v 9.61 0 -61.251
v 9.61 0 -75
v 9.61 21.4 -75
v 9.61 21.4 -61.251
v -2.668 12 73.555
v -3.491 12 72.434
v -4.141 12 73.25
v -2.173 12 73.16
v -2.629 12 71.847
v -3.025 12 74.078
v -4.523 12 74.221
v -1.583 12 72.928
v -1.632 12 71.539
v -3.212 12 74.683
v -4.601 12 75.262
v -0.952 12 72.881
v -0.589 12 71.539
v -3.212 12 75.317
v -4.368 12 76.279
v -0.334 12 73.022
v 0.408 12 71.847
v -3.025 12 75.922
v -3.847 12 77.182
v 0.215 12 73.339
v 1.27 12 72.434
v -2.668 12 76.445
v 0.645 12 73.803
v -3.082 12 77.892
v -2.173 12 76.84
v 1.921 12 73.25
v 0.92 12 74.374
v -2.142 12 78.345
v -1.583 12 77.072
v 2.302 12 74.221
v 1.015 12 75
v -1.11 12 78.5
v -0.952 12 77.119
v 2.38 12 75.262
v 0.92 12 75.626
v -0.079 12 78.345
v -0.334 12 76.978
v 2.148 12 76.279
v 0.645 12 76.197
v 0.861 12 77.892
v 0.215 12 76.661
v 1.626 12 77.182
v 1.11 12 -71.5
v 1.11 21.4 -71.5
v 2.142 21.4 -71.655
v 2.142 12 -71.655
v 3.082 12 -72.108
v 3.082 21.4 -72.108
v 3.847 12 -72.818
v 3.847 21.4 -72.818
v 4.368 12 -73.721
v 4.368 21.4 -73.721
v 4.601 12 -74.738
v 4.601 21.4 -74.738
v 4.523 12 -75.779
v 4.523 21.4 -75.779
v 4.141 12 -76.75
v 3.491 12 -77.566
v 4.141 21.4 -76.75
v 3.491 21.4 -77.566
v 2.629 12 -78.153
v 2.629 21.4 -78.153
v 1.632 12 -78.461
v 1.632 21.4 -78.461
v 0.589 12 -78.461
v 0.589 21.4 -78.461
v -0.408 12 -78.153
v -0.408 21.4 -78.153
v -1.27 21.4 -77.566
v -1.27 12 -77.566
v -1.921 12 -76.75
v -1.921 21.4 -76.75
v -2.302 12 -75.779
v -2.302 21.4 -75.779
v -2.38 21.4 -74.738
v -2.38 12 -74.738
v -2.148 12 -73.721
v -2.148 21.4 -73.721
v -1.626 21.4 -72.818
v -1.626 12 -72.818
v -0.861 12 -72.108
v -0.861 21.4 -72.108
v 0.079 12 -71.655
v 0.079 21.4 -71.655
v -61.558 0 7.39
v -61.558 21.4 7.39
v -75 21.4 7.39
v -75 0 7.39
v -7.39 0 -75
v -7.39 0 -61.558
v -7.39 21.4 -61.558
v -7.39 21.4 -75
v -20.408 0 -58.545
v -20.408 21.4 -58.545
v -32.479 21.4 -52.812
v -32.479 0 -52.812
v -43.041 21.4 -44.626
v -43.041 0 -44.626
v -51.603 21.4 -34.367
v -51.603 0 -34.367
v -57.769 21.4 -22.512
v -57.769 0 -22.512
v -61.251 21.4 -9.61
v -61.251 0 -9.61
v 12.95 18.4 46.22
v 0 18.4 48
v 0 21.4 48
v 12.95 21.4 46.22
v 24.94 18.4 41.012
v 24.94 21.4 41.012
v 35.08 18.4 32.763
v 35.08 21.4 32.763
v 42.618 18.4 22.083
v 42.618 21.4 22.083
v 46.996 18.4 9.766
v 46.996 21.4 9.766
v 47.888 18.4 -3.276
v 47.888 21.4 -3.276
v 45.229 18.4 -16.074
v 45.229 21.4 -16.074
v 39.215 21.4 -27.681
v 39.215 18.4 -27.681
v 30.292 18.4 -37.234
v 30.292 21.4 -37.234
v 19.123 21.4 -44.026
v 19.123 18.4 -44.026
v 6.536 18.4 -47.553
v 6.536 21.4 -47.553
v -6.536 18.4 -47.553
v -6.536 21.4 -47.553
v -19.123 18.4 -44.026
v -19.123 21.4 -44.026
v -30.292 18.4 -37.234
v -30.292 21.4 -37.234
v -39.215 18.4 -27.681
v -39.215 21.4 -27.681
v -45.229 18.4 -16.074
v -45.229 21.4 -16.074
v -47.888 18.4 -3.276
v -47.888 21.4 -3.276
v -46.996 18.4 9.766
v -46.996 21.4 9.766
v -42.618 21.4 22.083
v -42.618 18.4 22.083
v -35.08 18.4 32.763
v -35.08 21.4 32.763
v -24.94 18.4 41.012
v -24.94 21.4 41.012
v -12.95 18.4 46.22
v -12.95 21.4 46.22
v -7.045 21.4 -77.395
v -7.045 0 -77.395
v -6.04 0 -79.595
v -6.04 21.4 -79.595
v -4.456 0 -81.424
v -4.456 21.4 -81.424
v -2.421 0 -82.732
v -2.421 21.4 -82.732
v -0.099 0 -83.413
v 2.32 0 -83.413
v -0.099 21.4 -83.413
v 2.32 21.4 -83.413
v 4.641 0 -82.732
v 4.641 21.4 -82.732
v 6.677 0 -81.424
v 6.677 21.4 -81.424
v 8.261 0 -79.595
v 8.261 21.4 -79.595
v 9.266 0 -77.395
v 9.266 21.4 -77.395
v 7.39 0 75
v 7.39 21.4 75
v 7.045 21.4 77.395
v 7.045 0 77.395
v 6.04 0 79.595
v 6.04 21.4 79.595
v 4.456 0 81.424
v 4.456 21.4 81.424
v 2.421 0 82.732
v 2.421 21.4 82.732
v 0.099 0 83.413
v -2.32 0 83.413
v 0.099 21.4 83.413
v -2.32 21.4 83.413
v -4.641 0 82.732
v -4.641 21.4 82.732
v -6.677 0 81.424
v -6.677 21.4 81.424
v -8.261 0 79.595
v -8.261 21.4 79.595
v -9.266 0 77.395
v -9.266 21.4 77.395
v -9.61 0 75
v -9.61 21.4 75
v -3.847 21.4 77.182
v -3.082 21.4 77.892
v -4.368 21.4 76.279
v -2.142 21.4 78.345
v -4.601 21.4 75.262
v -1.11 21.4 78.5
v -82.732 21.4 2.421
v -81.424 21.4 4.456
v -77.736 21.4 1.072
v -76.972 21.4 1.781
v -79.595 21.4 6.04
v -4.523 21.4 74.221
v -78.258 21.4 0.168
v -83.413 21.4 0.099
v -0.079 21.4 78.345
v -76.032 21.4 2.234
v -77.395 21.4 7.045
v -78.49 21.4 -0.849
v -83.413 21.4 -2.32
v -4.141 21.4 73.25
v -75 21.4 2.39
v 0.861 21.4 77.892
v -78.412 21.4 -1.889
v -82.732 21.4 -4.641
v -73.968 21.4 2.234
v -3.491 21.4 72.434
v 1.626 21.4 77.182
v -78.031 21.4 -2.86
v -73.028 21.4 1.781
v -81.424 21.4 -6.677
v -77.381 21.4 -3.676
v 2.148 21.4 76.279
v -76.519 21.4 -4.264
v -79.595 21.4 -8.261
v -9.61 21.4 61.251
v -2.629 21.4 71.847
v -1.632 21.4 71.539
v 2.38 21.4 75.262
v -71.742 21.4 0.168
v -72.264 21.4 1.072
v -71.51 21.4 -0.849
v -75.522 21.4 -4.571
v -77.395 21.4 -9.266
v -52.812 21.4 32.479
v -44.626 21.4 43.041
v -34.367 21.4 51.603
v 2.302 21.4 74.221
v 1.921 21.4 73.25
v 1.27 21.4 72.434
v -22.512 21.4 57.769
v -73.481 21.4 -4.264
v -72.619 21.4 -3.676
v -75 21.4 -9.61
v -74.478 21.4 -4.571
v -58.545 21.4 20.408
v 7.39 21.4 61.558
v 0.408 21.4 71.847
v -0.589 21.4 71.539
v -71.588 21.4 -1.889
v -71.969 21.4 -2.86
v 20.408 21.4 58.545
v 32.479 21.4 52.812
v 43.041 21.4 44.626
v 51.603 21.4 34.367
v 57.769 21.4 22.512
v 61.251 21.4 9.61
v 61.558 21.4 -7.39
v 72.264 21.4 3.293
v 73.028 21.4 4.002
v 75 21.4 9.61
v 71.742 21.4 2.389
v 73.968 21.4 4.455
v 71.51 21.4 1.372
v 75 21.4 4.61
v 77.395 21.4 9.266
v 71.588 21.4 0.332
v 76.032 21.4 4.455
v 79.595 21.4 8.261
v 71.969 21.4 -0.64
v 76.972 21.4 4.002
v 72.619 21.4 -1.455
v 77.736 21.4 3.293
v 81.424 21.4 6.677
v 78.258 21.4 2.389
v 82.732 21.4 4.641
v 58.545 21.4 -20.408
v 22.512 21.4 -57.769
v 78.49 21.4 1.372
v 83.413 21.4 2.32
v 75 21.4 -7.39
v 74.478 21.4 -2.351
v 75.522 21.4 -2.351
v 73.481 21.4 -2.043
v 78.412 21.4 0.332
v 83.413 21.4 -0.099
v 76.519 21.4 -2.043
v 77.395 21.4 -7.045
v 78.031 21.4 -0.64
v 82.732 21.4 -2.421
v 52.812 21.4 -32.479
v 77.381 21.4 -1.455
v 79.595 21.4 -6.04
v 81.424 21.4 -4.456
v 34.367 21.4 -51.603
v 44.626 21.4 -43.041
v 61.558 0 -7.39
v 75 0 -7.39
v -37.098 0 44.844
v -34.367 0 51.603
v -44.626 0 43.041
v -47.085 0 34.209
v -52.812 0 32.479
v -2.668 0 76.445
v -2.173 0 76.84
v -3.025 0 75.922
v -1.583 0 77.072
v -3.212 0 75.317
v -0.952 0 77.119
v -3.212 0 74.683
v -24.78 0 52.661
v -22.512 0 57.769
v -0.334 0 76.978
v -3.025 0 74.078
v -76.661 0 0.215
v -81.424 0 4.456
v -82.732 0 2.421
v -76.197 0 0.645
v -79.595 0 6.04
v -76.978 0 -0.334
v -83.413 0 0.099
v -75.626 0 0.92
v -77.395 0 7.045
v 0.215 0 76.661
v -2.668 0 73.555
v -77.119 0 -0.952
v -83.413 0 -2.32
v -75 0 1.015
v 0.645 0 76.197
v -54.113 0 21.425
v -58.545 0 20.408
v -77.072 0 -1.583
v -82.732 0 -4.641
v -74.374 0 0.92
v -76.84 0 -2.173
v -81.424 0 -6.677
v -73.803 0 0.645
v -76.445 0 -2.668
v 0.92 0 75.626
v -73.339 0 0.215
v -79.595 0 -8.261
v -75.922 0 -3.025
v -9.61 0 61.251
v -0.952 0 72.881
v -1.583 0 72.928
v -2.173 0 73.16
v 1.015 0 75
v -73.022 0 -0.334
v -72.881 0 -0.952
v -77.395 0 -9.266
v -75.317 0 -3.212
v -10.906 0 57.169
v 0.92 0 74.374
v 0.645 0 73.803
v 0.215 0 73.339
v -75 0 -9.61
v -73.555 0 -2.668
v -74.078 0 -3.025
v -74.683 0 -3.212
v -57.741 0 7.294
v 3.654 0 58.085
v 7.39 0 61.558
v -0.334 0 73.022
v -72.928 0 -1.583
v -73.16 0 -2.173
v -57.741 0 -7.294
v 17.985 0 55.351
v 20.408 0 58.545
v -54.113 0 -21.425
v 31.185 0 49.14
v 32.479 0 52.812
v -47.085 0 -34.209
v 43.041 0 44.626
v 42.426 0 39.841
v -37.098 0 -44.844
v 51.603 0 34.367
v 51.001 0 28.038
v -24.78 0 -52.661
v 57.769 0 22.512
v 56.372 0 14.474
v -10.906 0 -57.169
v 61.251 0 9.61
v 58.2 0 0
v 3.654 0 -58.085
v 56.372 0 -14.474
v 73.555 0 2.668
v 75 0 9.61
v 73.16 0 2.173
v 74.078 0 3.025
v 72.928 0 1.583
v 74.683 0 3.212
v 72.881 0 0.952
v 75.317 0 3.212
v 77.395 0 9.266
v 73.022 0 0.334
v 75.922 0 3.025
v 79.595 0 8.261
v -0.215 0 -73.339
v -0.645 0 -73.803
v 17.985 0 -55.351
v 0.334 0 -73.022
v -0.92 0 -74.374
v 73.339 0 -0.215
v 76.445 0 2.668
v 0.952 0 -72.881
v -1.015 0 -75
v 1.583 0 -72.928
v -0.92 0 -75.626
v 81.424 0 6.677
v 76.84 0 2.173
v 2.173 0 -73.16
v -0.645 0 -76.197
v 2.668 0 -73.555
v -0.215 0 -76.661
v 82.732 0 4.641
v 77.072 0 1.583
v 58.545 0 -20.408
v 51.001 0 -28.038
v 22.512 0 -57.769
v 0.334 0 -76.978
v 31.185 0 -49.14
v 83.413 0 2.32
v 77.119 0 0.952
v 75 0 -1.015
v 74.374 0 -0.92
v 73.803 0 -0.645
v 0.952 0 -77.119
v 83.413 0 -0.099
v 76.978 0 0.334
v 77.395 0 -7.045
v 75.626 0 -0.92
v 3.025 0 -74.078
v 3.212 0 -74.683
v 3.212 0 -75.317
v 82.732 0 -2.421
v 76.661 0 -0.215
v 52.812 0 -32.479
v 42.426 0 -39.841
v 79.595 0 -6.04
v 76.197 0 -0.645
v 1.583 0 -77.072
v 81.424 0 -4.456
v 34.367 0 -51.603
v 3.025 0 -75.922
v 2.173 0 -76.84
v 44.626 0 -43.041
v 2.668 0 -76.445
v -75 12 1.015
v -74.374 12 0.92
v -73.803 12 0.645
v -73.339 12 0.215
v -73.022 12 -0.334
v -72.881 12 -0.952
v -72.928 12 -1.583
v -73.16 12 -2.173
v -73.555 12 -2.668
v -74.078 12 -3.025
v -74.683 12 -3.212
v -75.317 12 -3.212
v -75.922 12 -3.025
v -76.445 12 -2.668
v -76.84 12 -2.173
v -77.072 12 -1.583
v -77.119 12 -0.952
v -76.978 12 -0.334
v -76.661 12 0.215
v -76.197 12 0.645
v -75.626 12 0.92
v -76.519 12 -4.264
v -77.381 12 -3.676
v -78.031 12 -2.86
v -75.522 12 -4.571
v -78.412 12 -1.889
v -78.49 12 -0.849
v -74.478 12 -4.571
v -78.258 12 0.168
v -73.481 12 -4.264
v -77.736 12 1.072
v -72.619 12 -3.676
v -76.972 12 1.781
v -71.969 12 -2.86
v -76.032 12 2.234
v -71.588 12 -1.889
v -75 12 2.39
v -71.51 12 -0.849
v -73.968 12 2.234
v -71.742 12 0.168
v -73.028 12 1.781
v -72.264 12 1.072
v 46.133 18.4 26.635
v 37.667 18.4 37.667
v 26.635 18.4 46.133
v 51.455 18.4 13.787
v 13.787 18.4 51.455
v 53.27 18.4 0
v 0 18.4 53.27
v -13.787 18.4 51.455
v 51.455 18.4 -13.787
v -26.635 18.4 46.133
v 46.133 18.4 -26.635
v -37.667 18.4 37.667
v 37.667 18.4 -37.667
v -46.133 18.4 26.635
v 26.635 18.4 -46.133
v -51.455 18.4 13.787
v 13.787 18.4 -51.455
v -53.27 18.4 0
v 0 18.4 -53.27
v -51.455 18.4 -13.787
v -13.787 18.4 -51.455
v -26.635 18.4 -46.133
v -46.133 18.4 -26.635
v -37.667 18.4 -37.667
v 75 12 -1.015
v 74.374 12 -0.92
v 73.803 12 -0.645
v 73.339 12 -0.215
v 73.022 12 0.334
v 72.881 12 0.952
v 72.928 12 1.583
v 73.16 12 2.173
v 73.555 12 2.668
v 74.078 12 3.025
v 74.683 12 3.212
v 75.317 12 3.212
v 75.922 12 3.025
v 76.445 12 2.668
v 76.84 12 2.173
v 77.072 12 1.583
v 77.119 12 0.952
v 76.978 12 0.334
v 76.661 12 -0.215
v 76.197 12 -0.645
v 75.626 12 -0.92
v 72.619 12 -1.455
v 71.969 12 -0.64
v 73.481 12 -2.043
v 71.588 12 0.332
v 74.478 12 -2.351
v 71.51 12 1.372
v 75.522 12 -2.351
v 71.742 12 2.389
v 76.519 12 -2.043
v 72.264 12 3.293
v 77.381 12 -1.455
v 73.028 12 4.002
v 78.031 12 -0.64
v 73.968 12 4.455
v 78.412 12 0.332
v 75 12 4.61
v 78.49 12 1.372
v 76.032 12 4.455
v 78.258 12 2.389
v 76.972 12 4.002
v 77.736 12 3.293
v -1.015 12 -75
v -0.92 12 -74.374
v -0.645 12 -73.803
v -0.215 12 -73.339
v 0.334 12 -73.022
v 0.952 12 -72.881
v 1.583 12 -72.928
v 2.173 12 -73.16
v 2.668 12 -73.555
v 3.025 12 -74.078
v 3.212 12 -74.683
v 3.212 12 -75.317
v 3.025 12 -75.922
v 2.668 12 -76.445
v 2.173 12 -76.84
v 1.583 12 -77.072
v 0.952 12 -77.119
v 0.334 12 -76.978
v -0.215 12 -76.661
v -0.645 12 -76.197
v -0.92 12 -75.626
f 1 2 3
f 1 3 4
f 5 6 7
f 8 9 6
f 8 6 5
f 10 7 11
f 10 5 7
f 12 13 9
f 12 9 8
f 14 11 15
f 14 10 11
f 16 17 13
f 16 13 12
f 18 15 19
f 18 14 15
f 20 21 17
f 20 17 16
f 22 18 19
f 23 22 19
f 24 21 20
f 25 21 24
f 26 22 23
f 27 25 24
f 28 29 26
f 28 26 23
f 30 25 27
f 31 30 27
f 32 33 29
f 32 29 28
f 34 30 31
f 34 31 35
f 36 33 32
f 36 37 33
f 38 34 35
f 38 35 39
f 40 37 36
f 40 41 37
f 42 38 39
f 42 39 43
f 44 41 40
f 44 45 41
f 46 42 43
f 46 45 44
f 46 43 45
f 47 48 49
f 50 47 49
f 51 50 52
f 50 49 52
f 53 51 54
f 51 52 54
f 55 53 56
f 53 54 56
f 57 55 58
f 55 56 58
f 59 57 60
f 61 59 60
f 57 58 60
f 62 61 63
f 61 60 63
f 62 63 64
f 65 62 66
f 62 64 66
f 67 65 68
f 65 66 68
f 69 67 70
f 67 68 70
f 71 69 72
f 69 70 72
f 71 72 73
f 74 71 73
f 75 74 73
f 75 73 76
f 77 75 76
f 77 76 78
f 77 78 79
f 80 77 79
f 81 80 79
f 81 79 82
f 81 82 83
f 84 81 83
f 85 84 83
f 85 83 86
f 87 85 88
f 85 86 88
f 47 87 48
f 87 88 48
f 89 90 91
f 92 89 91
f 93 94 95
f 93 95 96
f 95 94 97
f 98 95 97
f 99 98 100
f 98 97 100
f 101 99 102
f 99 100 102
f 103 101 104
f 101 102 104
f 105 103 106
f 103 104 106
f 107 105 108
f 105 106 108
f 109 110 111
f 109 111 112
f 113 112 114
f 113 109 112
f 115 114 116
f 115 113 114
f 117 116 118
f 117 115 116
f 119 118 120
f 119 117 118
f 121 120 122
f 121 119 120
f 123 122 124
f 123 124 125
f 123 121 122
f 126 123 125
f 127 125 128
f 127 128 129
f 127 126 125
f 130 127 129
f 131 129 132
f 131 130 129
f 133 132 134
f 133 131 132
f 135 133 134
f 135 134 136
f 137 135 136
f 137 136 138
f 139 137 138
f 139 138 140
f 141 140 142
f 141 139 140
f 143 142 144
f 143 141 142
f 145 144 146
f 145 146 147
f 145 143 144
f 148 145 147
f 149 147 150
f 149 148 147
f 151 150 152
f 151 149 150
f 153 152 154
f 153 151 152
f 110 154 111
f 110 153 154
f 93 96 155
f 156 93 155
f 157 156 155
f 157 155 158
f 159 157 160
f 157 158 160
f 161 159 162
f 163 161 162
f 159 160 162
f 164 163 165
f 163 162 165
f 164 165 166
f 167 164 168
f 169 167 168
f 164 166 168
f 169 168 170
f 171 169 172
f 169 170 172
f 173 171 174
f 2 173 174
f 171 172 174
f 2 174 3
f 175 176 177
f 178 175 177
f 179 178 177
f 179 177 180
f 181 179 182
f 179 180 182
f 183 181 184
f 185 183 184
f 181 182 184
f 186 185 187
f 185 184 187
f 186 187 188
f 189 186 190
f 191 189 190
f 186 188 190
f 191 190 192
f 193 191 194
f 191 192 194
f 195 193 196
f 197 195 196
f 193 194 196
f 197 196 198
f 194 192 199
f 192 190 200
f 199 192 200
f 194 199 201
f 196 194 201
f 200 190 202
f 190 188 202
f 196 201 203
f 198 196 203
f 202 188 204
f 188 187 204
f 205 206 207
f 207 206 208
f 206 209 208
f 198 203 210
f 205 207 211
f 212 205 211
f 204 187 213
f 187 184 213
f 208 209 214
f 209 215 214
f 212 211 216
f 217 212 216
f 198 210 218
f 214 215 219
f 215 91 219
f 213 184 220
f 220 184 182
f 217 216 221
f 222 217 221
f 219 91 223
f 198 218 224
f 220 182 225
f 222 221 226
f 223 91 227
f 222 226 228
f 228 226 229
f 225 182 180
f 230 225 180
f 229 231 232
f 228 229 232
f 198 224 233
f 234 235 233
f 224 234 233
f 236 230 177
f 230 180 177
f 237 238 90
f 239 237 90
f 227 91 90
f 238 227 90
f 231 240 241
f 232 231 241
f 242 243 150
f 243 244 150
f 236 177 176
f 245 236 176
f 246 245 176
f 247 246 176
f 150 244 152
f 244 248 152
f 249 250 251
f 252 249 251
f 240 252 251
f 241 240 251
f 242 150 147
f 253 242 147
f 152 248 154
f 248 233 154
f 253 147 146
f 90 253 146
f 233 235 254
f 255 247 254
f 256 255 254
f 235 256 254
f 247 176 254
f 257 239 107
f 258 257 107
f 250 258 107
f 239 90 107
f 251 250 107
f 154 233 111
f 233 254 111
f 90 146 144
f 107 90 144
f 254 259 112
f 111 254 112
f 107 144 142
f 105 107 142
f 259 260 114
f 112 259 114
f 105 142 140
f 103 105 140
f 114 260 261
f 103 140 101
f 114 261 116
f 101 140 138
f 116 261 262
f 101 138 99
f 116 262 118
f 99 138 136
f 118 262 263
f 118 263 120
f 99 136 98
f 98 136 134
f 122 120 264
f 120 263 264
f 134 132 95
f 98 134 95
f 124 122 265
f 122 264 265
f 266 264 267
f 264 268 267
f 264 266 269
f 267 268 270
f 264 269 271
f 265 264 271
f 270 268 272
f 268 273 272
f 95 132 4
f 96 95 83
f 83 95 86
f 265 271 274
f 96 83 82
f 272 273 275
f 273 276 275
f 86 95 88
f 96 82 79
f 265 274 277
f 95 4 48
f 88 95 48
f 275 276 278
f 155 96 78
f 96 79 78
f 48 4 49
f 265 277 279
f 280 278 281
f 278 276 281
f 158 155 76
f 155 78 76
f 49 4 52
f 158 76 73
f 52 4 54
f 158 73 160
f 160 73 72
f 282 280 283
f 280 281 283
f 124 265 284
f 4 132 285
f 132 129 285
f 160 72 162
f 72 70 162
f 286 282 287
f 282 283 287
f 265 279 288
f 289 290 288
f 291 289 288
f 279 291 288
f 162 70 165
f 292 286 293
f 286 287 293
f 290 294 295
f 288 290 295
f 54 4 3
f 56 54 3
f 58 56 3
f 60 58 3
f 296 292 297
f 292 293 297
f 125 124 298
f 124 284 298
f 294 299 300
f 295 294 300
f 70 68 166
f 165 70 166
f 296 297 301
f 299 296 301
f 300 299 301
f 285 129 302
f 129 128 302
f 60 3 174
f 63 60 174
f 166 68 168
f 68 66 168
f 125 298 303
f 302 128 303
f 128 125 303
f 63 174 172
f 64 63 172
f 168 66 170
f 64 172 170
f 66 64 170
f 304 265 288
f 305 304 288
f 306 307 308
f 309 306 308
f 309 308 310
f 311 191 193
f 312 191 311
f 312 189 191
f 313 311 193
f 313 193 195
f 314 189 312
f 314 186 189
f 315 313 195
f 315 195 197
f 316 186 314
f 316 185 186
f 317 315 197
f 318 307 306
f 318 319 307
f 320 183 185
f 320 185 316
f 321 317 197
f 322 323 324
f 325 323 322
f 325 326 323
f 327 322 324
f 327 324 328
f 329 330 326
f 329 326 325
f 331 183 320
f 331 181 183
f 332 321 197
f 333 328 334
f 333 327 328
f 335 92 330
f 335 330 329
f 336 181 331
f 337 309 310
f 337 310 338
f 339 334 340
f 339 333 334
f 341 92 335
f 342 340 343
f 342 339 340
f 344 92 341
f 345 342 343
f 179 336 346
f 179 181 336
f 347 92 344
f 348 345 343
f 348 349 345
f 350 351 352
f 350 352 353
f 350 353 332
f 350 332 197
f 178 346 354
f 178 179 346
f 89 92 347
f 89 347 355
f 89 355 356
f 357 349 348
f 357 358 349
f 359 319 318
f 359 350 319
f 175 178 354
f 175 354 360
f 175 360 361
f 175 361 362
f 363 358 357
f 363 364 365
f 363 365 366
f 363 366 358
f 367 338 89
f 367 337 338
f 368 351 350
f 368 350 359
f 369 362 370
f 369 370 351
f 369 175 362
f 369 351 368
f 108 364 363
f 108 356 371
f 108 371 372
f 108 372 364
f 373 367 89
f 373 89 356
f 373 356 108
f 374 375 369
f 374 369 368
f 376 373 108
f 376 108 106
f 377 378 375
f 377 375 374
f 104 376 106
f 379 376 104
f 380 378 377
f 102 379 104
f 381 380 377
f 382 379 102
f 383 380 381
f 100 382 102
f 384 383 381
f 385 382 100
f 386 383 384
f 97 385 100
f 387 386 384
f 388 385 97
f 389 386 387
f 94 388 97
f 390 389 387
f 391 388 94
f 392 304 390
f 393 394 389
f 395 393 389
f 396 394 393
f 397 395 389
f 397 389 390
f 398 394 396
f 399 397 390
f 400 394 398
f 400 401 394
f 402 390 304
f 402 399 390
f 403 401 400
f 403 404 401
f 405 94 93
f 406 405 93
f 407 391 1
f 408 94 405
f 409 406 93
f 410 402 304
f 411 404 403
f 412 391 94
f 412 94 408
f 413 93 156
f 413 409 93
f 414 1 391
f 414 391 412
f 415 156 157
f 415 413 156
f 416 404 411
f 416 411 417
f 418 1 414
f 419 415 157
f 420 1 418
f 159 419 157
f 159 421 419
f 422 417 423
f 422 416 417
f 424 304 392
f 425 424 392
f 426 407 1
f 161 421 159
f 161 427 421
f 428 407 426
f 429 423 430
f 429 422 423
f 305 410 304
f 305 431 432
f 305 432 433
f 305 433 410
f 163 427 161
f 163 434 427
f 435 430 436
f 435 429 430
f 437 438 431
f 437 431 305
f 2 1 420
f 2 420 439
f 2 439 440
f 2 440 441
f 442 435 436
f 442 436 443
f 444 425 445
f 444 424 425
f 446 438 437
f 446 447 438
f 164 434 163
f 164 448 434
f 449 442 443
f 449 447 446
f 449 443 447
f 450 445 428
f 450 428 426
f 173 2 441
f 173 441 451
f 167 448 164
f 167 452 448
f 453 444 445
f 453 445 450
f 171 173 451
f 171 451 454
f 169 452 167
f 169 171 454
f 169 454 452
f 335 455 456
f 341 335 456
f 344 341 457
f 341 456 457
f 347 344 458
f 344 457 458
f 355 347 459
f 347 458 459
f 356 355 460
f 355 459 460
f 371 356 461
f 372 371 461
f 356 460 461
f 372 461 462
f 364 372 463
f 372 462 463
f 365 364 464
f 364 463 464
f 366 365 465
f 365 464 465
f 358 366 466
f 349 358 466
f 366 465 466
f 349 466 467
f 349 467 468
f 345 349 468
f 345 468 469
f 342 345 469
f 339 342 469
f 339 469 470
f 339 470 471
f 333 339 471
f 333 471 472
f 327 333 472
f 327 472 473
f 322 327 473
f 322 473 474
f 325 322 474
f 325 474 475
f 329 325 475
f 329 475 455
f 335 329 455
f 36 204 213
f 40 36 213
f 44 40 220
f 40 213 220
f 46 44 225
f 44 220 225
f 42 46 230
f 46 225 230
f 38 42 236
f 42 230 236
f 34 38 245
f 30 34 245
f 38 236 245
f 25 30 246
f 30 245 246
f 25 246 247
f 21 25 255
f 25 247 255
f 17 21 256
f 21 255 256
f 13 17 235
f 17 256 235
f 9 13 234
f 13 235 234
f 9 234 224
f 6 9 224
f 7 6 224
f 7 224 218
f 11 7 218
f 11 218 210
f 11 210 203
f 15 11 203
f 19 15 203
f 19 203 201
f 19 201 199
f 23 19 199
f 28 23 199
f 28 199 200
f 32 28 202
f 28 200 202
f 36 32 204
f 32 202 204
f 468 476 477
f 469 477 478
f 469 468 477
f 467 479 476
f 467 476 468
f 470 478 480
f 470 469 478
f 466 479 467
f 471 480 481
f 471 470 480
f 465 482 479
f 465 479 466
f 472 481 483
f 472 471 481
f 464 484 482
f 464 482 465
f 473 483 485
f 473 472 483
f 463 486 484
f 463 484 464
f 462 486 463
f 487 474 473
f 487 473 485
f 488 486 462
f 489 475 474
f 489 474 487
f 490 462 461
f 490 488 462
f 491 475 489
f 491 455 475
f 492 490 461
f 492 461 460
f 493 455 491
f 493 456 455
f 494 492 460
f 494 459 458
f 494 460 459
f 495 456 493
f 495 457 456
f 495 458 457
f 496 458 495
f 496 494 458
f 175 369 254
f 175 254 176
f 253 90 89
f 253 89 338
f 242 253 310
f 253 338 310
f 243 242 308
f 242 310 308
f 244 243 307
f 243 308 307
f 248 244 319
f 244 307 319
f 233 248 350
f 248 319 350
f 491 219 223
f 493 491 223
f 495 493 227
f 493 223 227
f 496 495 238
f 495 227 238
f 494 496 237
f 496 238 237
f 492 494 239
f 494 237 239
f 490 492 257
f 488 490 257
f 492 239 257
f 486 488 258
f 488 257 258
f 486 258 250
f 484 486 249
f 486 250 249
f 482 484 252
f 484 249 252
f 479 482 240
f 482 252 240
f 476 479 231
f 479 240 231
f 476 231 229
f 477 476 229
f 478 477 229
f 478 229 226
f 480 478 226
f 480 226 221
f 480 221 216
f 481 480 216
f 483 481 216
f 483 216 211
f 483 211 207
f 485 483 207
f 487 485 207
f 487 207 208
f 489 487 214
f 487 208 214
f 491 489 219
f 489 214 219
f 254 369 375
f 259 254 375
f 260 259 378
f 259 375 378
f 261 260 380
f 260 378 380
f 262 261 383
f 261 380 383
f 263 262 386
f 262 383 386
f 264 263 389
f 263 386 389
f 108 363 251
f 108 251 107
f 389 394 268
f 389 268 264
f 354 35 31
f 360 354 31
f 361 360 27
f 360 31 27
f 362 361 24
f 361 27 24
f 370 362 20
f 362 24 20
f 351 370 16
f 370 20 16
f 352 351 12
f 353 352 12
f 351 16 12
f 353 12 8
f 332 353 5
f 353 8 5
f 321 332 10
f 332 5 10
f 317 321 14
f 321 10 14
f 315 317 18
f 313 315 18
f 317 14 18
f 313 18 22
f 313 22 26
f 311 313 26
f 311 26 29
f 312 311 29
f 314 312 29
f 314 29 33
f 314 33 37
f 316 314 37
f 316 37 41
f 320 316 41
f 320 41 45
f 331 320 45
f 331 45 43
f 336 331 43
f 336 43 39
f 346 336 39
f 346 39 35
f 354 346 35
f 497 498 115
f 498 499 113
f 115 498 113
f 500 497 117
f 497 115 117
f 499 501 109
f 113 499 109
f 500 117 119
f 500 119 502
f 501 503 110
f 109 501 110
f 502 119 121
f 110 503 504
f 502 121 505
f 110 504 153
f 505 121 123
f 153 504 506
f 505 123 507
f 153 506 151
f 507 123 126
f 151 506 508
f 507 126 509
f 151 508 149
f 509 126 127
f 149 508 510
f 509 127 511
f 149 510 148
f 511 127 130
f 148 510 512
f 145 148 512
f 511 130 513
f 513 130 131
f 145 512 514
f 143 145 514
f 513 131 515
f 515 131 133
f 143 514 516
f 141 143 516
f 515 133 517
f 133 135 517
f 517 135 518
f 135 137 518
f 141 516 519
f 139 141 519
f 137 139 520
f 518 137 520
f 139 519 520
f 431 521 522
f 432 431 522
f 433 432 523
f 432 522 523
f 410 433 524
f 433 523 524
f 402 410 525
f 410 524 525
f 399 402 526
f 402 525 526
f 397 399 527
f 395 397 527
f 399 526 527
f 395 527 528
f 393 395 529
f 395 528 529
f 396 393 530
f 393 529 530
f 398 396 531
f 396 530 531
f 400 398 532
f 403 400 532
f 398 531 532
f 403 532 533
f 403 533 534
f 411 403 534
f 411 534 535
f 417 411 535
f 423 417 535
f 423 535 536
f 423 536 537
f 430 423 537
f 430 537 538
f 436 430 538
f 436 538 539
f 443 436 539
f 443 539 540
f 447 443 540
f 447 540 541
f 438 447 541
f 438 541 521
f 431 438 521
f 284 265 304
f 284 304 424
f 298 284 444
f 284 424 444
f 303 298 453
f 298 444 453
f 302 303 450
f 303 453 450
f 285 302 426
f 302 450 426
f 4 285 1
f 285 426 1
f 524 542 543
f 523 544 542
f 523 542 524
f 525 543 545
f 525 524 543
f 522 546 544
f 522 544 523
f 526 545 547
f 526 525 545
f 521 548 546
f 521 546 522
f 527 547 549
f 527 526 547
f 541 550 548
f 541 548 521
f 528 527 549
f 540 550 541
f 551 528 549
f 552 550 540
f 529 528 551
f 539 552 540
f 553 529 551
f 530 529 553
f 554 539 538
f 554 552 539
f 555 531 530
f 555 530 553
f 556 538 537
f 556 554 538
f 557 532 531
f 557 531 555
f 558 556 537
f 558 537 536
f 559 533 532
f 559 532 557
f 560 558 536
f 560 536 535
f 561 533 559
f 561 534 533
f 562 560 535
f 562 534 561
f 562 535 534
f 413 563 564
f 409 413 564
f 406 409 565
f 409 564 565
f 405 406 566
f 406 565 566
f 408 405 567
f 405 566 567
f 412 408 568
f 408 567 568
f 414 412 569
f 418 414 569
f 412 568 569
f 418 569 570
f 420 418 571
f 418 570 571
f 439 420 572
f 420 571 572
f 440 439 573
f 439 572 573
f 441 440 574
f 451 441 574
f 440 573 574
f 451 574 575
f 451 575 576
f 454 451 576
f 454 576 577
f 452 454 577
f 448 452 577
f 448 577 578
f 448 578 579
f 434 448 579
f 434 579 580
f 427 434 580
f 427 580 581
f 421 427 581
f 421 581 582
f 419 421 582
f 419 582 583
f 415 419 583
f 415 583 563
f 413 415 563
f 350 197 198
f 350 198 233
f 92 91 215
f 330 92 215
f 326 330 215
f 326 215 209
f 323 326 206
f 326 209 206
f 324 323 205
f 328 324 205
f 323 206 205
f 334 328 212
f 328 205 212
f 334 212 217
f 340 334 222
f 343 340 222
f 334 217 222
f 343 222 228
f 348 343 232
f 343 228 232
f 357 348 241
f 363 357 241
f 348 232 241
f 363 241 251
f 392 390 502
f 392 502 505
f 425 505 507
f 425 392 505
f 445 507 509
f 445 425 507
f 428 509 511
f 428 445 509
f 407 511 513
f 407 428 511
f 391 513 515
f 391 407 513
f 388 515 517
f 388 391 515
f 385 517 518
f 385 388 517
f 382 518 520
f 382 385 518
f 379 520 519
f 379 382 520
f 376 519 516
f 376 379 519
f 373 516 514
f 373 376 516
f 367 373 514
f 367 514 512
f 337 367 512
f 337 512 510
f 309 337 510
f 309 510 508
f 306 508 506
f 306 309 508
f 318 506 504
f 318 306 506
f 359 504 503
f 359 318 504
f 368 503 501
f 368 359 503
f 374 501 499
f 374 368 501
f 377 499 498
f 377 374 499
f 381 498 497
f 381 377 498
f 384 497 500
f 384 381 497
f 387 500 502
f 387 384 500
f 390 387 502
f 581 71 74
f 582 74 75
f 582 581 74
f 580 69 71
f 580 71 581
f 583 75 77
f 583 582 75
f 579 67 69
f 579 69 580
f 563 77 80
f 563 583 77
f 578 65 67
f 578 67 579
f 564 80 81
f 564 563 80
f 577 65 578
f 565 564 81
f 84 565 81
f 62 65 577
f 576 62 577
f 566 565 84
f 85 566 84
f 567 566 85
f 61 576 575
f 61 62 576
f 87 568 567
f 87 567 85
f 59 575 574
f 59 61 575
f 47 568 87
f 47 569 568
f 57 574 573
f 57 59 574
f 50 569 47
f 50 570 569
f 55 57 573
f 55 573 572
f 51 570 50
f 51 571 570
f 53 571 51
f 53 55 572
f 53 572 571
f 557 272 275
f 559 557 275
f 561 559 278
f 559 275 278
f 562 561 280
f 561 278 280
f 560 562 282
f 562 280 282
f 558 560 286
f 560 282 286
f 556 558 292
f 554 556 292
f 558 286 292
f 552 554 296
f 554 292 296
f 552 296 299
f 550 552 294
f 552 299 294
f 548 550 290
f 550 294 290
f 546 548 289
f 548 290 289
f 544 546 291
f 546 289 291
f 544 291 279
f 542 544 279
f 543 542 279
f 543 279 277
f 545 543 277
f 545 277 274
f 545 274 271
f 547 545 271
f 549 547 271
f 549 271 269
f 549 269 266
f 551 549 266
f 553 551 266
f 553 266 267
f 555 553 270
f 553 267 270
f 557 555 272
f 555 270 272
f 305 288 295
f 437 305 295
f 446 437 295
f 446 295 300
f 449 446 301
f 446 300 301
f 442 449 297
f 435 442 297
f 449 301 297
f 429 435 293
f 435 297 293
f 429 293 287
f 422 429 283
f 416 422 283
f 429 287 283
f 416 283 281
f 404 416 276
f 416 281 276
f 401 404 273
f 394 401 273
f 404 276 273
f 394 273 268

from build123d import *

# Parameters (mm, degrees)
SKETCH1_R           = 62
SKETCH1_R_2         = 58.2
BOSS_EXTRUDE1_DEPTH = 18.4
BOSS_EXTRUDE1_DRAFT = -15
SKETCH2_R           = 82
SKETCH2_R_2         = 62
CUT_EXTRUDE1_DEPTH  = 97.425519359
SKETCH3_R           = 62
SKETCH3_R_2         = 48
BOSS_EXTRUDE2_DEPTH = 3
SKETCH4_R           = 2.125
BOSS_EXTRUDE3_DEPTH = 21.4
CIRPATTERN1_COUNT   = 4
SKETCH5_R           = 3.5
CUT_EXTRUDE2_DEPTH  = 9.4


with BuildPart() as part:
    # Sketch1 → Boss-Extrude1 (with draft: the straight prism first)
    with BuildSketch(Plane(origin=(0, 0, 0), x_dir=(1, 0, 0), z_dir=(0, 1, 0))):
        Circle(SKETCH1_R)
        Circle(SKETCH1_R_2, mode=Mode.SUBTRACT)
    extrude(amount=BOSS_EXTRUDE1_DEPTH)
    # Boss-Extrude1: the draft: its side faces are tilted about the plane it starts from
    boss_extrude1_sides = [part.faces().sort_by_distance(p)[0] for p in [
        (-62, 9.2, 0),
        (-58.2, 9.2, 0),
    ]]
    draft(boss_extrude1_sides, Plane(origin=(0, 0, 0), x_dir=(1, 0, 0), z_dir=(0, 1, 0)), BOSS_EXTRUDE1_DRAFT)

    # Sketch2 → Cut-Extrude1 (cut, through all)
    with BuildSketch(Plane.XZ):
        Circle(SKETCH2_R)
        with Locations(Location((0, 0, 0), (0, 0, 270))):
            Circle(SKETCH2_R_2, mode=Mode.SUBTRACT)
    extrude(amount=-CUT_EXTRUDE1_DEPTH, mode=Mode.SUBTRACT)

    # Sketch3 → Boss-Extrude2 (add)
    with BuildSketch(Plane(origin=(0, 18.4, 0), x_dir=(1, 0, 0), z_dir=(0, 1, 0))):
        with Locations(Location((0, 0, 0), (0, 0, 90))):
            Circle(SKETCH3_R)
        with Locations(Location((0, 0, 0), (0, 0, 270))):
            Circle(SKETCH3_R_2, mode=Mode.SUBTRACT)
    extrude(amount=BOSS_EXTRUDE2_DEPTH)

    # Sketch4 → Boss-Extrude3 (add)
    with BuildSketch(Plane(origin=(0, 21.4, 0), x_dir=(1, 0, 0), z_dir=(0, 1, 0))):
        with BuildLine():
            Line((-75, 9.610336935), (-58.480915803, 9.610336935))
            Line((-58.480915803, 9.610336935), (-58.480915803, -7.389663065))
            Line((-58.480915803, -7.389663065), (-75, -7.389663065))
            ThreePointArc((-75, -7.389663065), (-83.5, 1.110336935), (-75, 9.610336935))
        make_face()
        with Locations(Location((-75, 1.110336935, 0), (0, 0, 270))):
            Circle(SKETCH4_R, mode=Mode.SUBTRACT)
    boss_extrude3 = extrude(amount=-BOSS_EXTRUDE3_DEPTH)

    # CirPattern1: Boss-Extrude3 ×4 about axis
    cirpattern1_axis = Axis((0, 0, 0), (0, 1, 0))
    for i in range(1, CIRPATTERN1_COUNT):
        add(boss_extrude3.rotate(cirpattern1_axis, i * 360 / CIRPATTERN1_COUNT))

    # Sketch5 → Cut-Extrude2 (cut)
    with BuildSketch(Plane(origin=(0, 21.4, 0), x_dir=(1, 0, 0), z_dir=(0, 1, 0))):
        with Locations(Location((-75, 1.110336935, 0), (0, 0, 270))):
            Circle(SKETCH5_R)
        with Locations(Location((1.110336935, 75, 0), (0, 0, 270))):
            Circle(SKETCH5_R)
        with Locations(Location((75, -1.110336935, 0), (0, 0, 270))):
            Circle(SKETCH5_R)
        with Locations(Location((-1.110336935, -75, 0), (0, 0, 270))):
            Circle(SKETCH5_R)
    extrude(amount=-CUT_EXTRUDE2_DEPTH, mode=Mode.SUBTRACT)


solid = part.part
